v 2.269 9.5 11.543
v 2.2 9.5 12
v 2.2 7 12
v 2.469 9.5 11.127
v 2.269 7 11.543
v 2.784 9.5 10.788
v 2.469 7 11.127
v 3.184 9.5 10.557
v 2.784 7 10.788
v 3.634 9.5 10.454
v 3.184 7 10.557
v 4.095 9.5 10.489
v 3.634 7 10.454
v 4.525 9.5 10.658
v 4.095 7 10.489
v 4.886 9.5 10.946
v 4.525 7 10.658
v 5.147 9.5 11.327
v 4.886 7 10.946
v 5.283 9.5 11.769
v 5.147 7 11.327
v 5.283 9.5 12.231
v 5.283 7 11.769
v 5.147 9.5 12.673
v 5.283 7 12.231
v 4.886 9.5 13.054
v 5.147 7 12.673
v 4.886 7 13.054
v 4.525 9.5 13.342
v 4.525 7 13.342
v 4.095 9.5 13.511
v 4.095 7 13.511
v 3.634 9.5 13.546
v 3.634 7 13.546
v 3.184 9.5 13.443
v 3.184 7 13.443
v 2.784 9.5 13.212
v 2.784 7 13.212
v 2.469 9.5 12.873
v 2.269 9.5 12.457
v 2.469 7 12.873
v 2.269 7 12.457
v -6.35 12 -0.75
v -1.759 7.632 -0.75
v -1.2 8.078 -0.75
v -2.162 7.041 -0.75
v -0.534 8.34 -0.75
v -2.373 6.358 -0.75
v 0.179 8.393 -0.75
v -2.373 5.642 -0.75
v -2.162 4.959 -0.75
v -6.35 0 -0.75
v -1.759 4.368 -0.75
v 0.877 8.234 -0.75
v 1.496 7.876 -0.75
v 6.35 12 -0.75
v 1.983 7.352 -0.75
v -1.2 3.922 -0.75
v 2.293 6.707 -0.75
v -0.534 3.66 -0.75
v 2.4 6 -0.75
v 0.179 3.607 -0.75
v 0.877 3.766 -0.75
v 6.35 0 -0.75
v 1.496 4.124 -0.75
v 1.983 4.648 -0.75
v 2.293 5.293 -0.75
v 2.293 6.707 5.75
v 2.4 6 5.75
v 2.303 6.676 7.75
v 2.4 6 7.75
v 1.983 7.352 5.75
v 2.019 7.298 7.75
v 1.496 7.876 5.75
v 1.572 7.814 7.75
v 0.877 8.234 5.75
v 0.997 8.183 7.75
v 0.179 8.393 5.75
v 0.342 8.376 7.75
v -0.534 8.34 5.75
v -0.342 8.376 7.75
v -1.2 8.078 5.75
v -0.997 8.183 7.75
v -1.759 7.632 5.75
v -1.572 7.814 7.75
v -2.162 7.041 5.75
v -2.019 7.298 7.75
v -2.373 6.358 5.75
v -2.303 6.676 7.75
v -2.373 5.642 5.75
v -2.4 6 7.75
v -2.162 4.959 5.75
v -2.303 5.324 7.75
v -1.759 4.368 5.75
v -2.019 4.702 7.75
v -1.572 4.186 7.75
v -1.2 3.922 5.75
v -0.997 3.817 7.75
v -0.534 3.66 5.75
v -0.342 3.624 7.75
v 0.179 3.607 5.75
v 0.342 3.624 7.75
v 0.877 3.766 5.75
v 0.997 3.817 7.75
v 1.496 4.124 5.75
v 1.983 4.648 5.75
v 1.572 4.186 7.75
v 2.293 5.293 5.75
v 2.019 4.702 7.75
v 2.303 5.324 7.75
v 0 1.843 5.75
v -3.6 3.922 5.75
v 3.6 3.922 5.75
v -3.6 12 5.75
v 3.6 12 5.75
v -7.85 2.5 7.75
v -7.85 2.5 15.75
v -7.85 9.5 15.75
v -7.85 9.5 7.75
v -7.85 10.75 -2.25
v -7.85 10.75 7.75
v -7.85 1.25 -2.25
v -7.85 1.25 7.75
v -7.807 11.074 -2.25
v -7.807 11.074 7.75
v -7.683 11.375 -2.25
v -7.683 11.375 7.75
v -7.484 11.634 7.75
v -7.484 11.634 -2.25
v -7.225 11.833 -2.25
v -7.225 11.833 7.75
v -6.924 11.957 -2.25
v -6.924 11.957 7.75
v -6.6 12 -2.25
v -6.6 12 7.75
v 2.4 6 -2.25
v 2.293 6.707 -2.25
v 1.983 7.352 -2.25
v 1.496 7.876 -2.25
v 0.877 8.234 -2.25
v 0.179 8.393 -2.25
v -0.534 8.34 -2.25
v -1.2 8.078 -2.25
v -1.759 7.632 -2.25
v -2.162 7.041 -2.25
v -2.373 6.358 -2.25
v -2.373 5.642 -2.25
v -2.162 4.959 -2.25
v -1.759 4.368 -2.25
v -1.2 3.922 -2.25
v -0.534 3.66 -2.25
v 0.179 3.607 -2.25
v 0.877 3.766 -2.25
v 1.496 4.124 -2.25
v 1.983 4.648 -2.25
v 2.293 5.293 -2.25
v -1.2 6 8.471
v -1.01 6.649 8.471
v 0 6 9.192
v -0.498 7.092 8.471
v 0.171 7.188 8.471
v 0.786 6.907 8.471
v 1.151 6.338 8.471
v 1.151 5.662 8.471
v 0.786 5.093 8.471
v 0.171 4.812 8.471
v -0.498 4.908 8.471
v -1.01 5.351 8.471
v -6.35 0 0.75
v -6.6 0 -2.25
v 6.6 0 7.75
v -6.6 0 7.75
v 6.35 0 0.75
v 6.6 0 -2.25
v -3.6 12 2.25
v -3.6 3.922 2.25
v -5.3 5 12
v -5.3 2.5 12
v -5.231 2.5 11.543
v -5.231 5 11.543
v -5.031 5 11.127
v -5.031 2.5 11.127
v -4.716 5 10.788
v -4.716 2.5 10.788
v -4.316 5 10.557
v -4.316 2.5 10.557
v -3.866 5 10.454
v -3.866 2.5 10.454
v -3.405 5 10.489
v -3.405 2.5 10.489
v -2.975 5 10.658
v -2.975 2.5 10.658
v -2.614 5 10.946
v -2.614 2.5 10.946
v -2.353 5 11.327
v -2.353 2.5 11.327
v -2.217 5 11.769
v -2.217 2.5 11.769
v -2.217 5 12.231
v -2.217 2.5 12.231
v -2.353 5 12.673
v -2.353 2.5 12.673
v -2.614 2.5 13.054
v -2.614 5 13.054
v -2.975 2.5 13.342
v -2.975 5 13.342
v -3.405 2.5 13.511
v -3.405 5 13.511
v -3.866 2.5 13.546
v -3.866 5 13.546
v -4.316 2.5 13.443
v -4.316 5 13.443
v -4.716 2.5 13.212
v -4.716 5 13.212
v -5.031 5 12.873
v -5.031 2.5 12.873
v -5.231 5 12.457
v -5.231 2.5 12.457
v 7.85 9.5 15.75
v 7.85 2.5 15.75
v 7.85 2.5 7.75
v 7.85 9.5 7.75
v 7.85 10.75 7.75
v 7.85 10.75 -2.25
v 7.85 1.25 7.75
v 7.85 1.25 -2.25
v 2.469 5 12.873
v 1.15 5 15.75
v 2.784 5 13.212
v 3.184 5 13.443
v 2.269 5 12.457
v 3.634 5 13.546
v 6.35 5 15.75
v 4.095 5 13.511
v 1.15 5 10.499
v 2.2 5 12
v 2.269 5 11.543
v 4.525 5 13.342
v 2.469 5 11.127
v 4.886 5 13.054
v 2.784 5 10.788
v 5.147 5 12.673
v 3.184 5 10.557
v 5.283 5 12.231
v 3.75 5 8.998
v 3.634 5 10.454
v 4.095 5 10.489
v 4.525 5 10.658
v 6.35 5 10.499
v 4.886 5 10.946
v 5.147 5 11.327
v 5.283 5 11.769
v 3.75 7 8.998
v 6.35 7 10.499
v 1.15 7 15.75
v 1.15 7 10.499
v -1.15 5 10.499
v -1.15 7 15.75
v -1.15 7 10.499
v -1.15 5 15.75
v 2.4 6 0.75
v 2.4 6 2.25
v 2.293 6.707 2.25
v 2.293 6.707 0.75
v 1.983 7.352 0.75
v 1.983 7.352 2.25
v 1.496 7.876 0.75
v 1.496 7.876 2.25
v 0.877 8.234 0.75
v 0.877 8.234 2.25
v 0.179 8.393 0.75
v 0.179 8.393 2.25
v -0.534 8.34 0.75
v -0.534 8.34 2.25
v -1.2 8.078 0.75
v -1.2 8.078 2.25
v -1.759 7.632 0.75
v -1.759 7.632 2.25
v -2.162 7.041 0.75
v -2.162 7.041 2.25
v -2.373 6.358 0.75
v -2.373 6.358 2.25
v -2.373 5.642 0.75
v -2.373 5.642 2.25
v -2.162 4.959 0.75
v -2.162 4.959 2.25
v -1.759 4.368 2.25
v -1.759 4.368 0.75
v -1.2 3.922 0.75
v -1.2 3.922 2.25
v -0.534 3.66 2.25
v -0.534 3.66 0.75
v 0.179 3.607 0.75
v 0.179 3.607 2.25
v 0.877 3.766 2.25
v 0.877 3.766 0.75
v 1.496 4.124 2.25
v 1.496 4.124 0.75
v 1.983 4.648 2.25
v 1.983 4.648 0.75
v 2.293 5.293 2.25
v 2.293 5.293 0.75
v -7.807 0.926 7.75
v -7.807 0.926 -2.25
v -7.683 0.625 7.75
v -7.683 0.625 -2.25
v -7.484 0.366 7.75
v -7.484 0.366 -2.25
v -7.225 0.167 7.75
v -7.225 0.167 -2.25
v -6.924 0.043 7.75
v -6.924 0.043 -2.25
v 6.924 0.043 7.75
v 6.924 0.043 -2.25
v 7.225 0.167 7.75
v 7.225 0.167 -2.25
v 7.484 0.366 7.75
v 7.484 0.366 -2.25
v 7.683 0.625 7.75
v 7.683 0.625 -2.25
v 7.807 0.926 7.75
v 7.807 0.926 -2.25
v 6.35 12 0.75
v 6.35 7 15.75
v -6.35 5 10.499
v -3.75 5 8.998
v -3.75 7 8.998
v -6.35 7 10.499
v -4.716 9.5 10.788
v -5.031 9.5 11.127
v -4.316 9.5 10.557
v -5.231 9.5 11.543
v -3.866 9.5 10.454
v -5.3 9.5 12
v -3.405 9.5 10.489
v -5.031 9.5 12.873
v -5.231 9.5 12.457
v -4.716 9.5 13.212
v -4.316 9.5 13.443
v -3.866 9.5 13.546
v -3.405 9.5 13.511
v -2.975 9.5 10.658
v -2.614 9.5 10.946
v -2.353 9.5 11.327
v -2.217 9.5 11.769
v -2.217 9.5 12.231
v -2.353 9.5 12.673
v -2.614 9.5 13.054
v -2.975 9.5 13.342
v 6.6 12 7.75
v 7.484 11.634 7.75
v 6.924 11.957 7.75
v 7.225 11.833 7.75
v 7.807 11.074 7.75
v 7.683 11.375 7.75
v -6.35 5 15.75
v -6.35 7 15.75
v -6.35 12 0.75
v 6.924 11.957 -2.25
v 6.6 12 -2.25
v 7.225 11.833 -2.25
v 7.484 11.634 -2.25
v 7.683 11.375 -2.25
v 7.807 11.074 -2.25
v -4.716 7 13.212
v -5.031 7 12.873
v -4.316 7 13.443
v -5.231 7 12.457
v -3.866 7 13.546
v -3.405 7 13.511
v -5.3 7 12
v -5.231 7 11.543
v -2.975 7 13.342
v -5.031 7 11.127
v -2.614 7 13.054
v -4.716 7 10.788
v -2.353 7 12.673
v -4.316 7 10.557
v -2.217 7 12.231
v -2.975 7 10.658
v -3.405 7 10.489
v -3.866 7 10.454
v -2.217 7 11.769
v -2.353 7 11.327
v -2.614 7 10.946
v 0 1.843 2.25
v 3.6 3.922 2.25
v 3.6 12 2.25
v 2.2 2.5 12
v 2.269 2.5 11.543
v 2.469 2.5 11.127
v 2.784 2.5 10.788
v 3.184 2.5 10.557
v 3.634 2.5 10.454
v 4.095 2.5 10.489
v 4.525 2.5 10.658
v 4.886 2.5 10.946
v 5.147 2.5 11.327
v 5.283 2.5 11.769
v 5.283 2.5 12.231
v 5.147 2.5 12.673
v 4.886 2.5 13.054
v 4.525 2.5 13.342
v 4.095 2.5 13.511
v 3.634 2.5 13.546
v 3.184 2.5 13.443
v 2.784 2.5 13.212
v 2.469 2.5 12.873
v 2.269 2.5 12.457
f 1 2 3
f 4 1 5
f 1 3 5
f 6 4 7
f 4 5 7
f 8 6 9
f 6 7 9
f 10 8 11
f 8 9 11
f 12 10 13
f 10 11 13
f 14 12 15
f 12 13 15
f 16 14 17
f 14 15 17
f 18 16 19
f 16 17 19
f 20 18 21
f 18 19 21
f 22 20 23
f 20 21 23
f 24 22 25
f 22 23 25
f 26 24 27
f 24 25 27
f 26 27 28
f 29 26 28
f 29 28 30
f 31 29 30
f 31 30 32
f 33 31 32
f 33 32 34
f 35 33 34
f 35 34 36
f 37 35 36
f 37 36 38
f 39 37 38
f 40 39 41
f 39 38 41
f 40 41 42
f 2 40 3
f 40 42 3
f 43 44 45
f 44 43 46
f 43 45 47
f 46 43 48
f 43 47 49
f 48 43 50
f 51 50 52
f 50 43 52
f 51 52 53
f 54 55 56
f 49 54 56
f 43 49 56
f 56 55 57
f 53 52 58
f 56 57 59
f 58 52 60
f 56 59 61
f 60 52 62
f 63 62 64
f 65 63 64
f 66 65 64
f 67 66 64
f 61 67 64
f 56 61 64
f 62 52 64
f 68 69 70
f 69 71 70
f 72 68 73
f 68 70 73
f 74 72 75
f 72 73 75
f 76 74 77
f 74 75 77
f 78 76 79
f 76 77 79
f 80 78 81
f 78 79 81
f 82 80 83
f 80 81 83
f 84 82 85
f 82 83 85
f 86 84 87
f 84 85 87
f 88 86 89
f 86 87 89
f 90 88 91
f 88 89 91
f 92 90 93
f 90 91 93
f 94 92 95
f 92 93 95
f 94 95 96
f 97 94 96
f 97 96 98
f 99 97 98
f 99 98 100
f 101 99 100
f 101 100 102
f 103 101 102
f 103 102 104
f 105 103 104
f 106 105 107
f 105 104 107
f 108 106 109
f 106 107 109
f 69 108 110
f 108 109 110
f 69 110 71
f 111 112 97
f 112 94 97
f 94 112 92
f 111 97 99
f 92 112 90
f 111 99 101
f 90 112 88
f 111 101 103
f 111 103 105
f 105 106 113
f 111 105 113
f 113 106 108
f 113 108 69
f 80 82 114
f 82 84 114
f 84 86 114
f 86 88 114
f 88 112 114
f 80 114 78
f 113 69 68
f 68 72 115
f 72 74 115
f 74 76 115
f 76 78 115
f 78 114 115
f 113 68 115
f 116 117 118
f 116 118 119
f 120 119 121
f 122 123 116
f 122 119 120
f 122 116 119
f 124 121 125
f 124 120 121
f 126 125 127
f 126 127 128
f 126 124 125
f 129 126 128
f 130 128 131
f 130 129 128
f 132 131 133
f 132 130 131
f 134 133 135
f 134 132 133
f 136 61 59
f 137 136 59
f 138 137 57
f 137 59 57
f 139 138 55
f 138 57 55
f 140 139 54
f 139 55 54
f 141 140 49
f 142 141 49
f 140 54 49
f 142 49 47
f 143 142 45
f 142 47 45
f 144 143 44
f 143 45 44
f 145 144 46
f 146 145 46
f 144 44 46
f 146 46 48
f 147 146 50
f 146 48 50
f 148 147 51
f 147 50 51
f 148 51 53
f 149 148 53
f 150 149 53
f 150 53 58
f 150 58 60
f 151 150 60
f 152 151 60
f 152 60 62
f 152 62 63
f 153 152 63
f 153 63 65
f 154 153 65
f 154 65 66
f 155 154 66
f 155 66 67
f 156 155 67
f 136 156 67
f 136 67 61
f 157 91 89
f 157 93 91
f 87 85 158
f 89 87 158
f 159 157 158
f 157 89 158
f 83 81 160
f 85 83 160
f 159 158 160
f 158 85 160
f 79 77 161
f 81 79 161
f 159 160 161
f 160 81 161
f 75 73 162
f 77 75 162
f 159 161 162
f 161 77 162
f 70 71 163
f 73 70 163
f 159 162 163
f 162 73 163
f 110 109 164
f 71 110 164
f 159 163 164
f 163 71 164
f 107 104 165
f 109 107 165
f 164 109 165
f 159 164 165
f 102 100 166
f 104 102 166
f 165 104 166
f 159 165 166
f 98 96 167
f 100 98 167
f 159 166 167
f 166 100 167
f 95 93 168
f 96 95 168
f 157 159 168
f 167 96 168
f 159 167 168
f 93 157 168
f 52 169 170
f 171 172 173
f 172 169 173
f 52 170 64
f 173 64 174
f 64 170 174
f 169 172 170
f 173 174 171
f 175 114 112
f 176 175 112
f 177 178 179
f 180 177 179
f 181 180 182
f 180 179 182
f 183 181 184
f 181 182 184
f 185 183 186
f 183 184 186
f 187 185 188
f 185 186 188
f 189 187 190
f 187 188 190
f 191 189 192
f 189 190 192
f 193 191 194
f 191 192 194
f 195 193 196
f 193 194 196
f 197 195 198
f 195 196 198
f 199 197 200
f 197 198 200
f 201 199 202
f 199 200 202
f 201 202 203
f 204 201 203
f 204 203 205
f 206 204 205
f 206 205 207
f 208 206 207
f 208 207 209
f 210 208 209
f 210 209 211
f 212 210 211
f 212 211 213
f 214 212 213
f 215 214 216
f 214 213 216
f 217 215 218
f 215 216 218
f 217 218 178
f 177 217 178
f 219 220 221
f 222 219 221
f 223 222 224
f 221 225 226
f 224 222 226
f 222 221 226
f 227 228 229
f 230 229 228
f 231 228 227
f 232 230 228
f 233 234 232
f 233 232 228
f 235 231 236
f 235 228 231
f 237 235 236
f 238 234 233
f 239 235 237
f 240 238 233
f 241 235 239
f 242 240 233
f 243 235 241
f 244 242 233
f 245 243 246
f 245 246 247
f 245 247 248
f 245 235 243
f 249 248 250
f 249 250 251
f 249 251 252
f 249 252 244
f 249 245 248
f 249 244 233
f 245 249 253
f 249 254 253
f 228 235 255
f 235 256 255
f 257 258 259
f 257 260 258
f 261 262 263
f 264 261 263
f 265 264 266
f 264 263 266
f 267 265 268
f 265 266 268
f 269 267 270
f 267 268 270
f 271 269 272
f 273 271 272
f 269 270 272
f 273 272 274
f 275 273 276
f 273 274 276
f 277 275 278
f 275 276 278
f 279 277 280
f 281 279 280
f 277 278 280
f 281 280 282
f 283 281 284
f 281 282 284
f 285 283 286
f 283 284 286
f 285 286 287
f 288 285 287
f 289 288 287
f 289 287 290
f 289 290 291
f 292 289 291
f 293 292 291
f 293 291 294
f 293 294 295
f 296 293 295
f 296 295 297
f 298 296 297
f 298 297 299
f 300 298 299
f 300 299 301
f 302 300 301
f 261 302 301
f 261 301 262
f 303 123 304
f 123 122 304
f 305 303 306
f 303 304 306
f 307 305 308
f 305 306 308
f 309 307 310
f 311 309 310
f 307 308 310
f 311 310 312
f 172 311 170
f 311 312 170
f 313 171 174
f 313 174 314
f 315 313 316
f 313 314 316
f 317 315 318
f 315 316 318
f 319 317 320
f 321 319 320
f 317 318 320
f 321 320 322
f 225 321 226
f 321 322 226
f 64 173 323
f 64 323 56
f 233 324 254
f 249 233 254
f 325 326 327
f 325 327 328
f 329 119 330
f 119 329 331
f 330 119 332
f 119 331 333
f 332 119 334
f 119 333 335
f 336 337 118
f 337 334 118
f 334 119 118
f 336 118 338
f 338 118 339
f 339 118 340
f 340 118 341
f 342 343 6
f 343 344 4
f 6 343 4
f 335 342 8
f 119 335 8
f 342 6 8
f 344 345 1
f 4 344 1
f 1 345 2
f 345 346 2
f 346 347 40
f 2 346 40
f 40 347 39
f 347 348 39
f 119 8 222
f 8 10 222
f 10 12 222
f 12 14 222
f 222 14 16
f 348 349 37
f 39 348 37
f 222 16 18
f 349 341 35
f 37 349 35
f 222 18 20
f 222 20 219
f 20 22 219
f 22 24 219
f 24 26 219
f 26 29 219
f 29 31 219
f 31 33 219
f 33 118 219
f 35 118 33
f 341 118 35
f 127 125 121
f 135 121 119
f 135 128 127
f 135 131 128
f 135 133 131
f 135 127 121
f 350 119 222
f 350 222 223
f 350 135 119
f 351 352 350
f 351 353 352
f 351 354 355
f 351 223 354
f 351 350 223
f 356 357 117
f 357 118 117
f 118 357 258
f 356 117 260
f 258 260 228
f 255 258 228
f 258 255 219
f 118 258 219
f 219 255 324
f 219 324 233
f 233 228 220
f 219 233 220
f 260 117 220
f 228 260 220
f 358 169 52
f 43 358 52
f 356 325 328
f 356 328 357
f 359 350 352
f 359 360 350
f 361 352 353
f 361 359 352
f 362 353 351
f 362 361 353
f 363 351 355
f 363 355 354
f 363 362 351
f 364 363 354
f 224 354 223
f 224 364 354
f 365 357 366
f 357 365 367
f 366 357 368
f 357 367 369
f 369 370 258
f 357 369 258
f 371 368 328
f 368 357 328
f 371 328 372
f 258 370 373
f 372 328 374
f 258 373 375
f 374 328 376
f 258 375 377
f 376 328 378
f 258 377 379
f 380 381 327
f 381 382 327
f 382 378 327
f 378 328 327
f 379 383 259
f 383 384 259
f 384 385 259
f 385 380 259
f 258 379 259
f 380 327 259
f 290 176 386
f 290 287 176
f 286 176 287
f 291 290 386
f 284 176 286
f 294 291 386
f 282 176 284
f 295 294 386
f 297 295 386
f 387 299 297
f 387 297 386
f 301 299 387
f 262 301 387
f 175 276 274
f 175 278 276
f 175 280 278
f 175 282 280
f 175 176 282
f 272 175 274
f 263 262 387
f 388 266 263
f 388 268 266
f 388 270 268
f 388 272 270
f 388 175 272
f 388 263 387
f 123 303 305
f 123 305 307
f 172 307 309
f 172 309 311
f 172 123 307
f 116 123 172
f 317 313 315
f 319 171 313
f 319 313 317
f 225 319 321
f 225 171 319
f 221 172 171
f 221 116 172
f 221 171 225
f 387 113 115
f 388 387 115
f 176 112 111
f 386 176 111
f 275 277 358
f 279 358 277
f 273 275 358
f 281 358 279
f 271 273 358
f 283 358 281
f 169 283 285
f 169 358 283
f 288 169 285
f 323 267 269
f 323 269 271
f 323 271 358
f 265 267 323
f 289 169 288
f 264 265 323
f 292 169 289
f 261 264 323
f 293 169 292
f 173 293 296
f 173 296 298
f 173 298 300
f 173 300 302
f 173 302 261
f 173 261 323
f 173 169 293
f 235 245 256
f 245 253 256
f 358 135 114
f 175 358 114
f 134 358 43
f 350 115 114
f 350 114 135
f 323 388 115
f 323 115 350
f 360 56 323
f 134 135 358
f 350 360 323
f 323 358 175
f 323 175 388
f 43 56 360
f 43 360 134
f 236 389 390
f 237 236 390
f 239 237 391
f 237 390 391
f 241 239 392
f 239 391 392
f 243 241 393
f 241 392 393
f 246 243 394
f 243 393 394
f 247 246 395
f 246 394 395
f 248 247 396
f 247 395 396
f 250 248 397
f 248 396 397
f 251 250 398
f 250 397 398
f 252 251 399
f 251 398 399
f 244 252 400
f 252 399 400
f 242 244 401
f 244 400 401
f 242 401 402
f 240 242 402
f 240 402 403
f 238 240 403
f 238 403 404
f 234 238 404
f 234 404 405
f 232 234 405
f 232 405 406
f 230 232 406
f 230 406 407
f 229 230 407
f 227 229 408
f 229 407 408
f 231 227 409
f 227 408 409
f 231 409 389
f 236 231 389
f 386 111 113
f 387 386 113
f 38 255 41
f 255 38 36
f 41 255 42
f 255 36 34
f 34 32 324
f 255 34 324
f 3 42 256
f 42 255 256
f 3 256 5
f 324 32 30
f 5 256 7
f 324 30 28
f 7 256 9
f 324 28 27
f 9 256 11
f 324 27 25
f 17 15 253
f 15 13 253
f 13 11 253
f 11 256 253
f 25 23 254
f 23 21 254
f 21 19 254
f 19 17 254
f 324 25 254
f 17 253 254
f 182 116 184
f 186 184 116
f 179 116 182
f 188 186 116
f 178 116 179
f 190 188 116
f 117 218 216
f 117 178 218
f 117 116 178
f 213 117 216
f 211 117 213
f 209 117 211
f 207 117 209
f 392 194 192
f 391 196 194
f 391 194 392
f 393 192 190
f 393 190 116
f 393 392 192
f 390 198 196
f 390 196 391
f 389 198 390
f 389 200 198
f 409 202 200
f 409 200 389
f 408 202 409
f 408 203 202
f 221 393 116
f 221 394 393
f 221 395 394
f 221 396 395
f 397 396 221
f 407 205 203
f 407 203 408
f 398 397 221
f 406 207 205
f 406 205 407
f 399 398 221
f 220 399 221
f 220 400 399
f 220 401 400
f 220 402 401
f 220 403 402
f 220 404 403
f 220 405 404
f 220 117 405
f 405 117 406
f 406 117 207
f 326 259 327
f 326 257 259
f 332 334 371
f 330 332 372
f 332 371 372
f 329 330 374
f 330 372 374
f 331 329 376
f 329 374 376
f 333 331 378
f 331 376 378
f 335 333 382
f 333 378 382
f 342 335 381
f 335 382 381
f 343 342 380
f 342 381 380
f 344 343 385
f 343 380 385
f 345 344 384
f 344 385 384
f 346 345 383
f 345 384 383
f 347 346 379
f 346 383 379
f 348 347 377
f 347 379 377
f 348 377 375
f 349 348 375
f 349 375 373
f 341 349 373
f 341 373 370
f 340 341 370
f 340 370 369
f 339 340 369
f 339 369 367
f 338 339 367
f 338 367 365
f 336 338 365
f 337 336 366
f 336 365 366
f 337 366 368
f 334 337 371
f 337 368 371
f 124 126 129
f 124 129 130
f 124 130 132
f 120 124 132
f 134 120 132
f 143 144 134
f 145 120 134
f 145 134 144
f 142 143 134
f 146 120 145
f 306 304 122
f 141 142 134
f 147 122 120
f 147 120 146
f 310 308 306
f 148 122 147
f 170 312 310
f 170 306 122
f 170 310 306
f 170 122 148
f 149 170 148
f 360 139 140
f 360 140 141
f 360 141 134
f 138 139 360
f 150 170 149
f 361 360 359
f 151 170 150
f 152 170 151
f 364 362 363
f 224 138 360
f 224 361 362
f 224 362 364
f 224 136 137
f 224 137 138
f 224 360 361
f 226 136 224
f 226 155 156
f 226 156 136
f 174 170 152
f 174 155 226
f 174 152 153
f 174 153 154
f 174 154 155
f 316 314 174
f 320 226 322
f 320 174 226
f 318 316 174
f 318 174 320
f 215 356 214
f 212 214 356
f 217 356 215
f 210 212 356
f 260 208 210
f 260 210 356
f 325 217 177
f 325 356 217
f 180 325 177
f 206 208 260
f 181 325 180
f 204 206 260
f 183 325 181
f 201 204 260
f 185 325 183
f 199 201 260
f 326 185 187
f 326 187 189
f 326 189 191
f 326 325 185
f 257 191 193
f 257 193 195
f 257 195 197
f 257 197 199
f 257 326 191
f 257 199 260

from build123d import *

# Parameters (mm, degrees)
SKETCH1_W                  = 15.7
SKETCH1_H                  = 18
SKETCH1_W_2                = 12.7
SKETCH1_H_2                = 1.5
BOSS_EXTRUDE1_DEPTH        = 12
CUT_EXTRUDE1_START         = -10
CUT_EXTRUDE1_DEPTH         = 3.5
M4_CLEARANCE_HOLE2_D       = 4.8
M4_CLEARANCE_HOLE2_DEPTH   = 10
M4_CLEARANCE_HOLE2_TIP     = 1.442065486
M2_5_CLEARANCE_HOLE1_D     = 3.1
M2_5_CLEARANCE_HOLE1_DEPTH = 10
M2_5_CLEARANCE_HOLE1_TIP   = 0.931333959
CUT_EXTRUDE3_START         = -6
SKETCH9_R                  = 1.55
CUT_EXTRUDE3_DEPTH         = 1
SKETCH14_W                 = 15.7
SKETCH14_H                 = 2.5
CUT_EXTRUDE5_DEPTH         = 8
FILLET1_R                  = 1.25


with BuildPart() as part:
    # Sketch1 → Boss-Extrude1 (new body)
    with BuildSketch(Plane(origin=(0, 0, 0), x_dir=(1, 0, 0), z_dir=(0, 1, 0))):
        with Locations((0, -6.75)):
            Rectangle(SKETCH1_W, SKETCH1_H)
        Rectangle(SKETCH1_W_2, SKETCH1_H_2, mode=Mode.SUBTRACT)
    extrude(amount=BOSS_EXTRUDE1_DEPTH)

    # Sketch2 → Cut-Extrude1 (cut)
    with BuildSketch(Plane.XY.offset(15.75).offset(CUT_EXTRUDE1_START)):
        Polygon((3.6, 12), (-3.6, 12), (-3.6, 8.078460969), (0, 10.156921938), (3.6, 8.078460969), align=None)
        Polygon((-3.6, 3.921539031), (0, 1.843078062), (3.6, 3.921539031), (3.6, 8.078460969), (0, 10.156921938), (-3.6, 8.078460969), align=None)
    extrude(amount=-CUT_EXTRUDE1_DEPTH, mode=Mode.SUBTRACT)

    # M4 Clearance Hole2
    with Locations(Plane(origin=(0, 0, -2.25), x_dir=(-1, 0, 0), z_dir=(0, 0, -1))):
        with Locations((0, 6)):
            Hole(M4_CLEARANCE_HOLE2_D / 2, depth=M4_CLEARANCE_HOLE2_DEPTH)
            with Locations((0, 0, -(M4_CLEARANCE_HOLE2_DEPTH + M4_CLEARANCE_HOLE2_TIP / 2))):  # 118° drill point
                Cone(0, M4_CLEARANCE_HOLE2_D / 2, M4_CLEARANCE_HOLE2_TIP, mode=Mode.SUBTRACT)

    # M2.5 Clearance Hole1
    with Locations(Plane(origin=(0, 12, 0), x_dir=(1, 0, 0), z_dir=(0, 1, 0))):
        with Locations((3.75, -12), (-3.75, -12)):
            Hole(M2_5_CLEARANCE_HOLE1_D / 2, depth=M2_5_CLEARANCE_HOLE1_DEPTH)
            with Locations((0, 0, -(M2_5_CLEARANCE_HOLE1_DEPTH + M2_5_CLEARANCE_HOLE1_TIP / 2))):  # 118° drill point
                Cone(0, M2_5_CLEARANCE_HOLE1_D / 2, M2_5_CLEARANCE_HOLE1_TIP, mode=Mode.SUBTRACT)

    # Sketch9 → Cut-Extrude3 (cut, symmetric)
    # profile 1 of 4: a face of its own
    with BuildSketch(Plane(origin=(0, 12, 0), x_dir=(1, 0, 0), z_dir=(0, 1, 0)).offset(CUT_EXTRUDE3_START)):
        Polygon((-3.75, -15.0022214), (-6.35, -13.5011107), (-6.35, -15.75), (-1.15, -15.75), (-1.15, -13.5011107), align=None)
    # profile 2 of 4: a face of its own
    with BuildSketch(Plane(origin=(0, 12, 0), x_dir=(1, 0, 0), z_dir=(0, 1, 0)).offset(CUT_EXTRUDE3_START)):
        Polygon((-6.35, -13.5011107), (-3.75, -15.0022214), (-1.15, -13.5011107), (-1.15, -10.4988893), (-3.75, -8.9977786), (-6.35, -10.4988893), align=None)
        with Locations(Location((-3.75, -12, 0), (0, 0, 270))):
            Circle(SKETCH9_R, mode=Mode.SUBTRACT)
    # profile 3 of 4: a face of its own
    with BuildSketch(Plane(origin=(0, 12, 0), x_dir=(1, 0, 0), z_dir=(0, 1, 0)).offset(CUT_EXTRUDE3_START)):
        Polygon((1.15, -13.5011107), (1.15, -15.75), (6.35, -15.75), (6.35, -13.5011107), (3.75, -15.0022214), align=None)
    # profile 4 of 4: a face of its own
    with BuildSketch(Plane(origin=(0, 12, 0), x_dir=(1, 0, 0), z_dir=(0, 1, 0)).offset(CUT_EXTRUDE3_START)):
        Polygon((1.15, -13.5011107), (3.75, -15.0022214), (6.35, -13.5011107), (6.35, -10.4988893), (3.75, -8.9977786), (1.15, -10.4988893), align=None)
        with Locations(Location((3.75, -12, 0), (0, 0, 270))):
            Circle(SKETCH9_R, mode=Mode.SUBTRACT)
    extrude(amount=CUT_EXTRUDE3_DEPTH, both=True, mode=Mode.SUBTRACT)

    # Sketch14 → Cut-Extrude5 (cut)
    with BuildSketch(Plane.XY.offset(15.75)):
        with Locations((0, 1.25)):
            Rectangle(SKETCH14_W, SKETCH14_H)
        with Locations((0, 10.75)):
            Rectangle(SKETCH14_W, SKETCH14_H)
    extrude(amount=-CUT_EXTRUDE5_DEPTH, mode=Mode.SUBTRACT)

    # Fillet1
    fillet1_edges = [part.edges().sort_by_distance(p)[0] for p in [
        (7.85, 0, 2.75),
        (7.85, 12, 2.75),
        (-7.85, 12, 2.75),
        (-7.85, 0, 2.75),
    ]]
    fillet(fillet1_edges, radius=FILLET1_R)


solid = part.part
